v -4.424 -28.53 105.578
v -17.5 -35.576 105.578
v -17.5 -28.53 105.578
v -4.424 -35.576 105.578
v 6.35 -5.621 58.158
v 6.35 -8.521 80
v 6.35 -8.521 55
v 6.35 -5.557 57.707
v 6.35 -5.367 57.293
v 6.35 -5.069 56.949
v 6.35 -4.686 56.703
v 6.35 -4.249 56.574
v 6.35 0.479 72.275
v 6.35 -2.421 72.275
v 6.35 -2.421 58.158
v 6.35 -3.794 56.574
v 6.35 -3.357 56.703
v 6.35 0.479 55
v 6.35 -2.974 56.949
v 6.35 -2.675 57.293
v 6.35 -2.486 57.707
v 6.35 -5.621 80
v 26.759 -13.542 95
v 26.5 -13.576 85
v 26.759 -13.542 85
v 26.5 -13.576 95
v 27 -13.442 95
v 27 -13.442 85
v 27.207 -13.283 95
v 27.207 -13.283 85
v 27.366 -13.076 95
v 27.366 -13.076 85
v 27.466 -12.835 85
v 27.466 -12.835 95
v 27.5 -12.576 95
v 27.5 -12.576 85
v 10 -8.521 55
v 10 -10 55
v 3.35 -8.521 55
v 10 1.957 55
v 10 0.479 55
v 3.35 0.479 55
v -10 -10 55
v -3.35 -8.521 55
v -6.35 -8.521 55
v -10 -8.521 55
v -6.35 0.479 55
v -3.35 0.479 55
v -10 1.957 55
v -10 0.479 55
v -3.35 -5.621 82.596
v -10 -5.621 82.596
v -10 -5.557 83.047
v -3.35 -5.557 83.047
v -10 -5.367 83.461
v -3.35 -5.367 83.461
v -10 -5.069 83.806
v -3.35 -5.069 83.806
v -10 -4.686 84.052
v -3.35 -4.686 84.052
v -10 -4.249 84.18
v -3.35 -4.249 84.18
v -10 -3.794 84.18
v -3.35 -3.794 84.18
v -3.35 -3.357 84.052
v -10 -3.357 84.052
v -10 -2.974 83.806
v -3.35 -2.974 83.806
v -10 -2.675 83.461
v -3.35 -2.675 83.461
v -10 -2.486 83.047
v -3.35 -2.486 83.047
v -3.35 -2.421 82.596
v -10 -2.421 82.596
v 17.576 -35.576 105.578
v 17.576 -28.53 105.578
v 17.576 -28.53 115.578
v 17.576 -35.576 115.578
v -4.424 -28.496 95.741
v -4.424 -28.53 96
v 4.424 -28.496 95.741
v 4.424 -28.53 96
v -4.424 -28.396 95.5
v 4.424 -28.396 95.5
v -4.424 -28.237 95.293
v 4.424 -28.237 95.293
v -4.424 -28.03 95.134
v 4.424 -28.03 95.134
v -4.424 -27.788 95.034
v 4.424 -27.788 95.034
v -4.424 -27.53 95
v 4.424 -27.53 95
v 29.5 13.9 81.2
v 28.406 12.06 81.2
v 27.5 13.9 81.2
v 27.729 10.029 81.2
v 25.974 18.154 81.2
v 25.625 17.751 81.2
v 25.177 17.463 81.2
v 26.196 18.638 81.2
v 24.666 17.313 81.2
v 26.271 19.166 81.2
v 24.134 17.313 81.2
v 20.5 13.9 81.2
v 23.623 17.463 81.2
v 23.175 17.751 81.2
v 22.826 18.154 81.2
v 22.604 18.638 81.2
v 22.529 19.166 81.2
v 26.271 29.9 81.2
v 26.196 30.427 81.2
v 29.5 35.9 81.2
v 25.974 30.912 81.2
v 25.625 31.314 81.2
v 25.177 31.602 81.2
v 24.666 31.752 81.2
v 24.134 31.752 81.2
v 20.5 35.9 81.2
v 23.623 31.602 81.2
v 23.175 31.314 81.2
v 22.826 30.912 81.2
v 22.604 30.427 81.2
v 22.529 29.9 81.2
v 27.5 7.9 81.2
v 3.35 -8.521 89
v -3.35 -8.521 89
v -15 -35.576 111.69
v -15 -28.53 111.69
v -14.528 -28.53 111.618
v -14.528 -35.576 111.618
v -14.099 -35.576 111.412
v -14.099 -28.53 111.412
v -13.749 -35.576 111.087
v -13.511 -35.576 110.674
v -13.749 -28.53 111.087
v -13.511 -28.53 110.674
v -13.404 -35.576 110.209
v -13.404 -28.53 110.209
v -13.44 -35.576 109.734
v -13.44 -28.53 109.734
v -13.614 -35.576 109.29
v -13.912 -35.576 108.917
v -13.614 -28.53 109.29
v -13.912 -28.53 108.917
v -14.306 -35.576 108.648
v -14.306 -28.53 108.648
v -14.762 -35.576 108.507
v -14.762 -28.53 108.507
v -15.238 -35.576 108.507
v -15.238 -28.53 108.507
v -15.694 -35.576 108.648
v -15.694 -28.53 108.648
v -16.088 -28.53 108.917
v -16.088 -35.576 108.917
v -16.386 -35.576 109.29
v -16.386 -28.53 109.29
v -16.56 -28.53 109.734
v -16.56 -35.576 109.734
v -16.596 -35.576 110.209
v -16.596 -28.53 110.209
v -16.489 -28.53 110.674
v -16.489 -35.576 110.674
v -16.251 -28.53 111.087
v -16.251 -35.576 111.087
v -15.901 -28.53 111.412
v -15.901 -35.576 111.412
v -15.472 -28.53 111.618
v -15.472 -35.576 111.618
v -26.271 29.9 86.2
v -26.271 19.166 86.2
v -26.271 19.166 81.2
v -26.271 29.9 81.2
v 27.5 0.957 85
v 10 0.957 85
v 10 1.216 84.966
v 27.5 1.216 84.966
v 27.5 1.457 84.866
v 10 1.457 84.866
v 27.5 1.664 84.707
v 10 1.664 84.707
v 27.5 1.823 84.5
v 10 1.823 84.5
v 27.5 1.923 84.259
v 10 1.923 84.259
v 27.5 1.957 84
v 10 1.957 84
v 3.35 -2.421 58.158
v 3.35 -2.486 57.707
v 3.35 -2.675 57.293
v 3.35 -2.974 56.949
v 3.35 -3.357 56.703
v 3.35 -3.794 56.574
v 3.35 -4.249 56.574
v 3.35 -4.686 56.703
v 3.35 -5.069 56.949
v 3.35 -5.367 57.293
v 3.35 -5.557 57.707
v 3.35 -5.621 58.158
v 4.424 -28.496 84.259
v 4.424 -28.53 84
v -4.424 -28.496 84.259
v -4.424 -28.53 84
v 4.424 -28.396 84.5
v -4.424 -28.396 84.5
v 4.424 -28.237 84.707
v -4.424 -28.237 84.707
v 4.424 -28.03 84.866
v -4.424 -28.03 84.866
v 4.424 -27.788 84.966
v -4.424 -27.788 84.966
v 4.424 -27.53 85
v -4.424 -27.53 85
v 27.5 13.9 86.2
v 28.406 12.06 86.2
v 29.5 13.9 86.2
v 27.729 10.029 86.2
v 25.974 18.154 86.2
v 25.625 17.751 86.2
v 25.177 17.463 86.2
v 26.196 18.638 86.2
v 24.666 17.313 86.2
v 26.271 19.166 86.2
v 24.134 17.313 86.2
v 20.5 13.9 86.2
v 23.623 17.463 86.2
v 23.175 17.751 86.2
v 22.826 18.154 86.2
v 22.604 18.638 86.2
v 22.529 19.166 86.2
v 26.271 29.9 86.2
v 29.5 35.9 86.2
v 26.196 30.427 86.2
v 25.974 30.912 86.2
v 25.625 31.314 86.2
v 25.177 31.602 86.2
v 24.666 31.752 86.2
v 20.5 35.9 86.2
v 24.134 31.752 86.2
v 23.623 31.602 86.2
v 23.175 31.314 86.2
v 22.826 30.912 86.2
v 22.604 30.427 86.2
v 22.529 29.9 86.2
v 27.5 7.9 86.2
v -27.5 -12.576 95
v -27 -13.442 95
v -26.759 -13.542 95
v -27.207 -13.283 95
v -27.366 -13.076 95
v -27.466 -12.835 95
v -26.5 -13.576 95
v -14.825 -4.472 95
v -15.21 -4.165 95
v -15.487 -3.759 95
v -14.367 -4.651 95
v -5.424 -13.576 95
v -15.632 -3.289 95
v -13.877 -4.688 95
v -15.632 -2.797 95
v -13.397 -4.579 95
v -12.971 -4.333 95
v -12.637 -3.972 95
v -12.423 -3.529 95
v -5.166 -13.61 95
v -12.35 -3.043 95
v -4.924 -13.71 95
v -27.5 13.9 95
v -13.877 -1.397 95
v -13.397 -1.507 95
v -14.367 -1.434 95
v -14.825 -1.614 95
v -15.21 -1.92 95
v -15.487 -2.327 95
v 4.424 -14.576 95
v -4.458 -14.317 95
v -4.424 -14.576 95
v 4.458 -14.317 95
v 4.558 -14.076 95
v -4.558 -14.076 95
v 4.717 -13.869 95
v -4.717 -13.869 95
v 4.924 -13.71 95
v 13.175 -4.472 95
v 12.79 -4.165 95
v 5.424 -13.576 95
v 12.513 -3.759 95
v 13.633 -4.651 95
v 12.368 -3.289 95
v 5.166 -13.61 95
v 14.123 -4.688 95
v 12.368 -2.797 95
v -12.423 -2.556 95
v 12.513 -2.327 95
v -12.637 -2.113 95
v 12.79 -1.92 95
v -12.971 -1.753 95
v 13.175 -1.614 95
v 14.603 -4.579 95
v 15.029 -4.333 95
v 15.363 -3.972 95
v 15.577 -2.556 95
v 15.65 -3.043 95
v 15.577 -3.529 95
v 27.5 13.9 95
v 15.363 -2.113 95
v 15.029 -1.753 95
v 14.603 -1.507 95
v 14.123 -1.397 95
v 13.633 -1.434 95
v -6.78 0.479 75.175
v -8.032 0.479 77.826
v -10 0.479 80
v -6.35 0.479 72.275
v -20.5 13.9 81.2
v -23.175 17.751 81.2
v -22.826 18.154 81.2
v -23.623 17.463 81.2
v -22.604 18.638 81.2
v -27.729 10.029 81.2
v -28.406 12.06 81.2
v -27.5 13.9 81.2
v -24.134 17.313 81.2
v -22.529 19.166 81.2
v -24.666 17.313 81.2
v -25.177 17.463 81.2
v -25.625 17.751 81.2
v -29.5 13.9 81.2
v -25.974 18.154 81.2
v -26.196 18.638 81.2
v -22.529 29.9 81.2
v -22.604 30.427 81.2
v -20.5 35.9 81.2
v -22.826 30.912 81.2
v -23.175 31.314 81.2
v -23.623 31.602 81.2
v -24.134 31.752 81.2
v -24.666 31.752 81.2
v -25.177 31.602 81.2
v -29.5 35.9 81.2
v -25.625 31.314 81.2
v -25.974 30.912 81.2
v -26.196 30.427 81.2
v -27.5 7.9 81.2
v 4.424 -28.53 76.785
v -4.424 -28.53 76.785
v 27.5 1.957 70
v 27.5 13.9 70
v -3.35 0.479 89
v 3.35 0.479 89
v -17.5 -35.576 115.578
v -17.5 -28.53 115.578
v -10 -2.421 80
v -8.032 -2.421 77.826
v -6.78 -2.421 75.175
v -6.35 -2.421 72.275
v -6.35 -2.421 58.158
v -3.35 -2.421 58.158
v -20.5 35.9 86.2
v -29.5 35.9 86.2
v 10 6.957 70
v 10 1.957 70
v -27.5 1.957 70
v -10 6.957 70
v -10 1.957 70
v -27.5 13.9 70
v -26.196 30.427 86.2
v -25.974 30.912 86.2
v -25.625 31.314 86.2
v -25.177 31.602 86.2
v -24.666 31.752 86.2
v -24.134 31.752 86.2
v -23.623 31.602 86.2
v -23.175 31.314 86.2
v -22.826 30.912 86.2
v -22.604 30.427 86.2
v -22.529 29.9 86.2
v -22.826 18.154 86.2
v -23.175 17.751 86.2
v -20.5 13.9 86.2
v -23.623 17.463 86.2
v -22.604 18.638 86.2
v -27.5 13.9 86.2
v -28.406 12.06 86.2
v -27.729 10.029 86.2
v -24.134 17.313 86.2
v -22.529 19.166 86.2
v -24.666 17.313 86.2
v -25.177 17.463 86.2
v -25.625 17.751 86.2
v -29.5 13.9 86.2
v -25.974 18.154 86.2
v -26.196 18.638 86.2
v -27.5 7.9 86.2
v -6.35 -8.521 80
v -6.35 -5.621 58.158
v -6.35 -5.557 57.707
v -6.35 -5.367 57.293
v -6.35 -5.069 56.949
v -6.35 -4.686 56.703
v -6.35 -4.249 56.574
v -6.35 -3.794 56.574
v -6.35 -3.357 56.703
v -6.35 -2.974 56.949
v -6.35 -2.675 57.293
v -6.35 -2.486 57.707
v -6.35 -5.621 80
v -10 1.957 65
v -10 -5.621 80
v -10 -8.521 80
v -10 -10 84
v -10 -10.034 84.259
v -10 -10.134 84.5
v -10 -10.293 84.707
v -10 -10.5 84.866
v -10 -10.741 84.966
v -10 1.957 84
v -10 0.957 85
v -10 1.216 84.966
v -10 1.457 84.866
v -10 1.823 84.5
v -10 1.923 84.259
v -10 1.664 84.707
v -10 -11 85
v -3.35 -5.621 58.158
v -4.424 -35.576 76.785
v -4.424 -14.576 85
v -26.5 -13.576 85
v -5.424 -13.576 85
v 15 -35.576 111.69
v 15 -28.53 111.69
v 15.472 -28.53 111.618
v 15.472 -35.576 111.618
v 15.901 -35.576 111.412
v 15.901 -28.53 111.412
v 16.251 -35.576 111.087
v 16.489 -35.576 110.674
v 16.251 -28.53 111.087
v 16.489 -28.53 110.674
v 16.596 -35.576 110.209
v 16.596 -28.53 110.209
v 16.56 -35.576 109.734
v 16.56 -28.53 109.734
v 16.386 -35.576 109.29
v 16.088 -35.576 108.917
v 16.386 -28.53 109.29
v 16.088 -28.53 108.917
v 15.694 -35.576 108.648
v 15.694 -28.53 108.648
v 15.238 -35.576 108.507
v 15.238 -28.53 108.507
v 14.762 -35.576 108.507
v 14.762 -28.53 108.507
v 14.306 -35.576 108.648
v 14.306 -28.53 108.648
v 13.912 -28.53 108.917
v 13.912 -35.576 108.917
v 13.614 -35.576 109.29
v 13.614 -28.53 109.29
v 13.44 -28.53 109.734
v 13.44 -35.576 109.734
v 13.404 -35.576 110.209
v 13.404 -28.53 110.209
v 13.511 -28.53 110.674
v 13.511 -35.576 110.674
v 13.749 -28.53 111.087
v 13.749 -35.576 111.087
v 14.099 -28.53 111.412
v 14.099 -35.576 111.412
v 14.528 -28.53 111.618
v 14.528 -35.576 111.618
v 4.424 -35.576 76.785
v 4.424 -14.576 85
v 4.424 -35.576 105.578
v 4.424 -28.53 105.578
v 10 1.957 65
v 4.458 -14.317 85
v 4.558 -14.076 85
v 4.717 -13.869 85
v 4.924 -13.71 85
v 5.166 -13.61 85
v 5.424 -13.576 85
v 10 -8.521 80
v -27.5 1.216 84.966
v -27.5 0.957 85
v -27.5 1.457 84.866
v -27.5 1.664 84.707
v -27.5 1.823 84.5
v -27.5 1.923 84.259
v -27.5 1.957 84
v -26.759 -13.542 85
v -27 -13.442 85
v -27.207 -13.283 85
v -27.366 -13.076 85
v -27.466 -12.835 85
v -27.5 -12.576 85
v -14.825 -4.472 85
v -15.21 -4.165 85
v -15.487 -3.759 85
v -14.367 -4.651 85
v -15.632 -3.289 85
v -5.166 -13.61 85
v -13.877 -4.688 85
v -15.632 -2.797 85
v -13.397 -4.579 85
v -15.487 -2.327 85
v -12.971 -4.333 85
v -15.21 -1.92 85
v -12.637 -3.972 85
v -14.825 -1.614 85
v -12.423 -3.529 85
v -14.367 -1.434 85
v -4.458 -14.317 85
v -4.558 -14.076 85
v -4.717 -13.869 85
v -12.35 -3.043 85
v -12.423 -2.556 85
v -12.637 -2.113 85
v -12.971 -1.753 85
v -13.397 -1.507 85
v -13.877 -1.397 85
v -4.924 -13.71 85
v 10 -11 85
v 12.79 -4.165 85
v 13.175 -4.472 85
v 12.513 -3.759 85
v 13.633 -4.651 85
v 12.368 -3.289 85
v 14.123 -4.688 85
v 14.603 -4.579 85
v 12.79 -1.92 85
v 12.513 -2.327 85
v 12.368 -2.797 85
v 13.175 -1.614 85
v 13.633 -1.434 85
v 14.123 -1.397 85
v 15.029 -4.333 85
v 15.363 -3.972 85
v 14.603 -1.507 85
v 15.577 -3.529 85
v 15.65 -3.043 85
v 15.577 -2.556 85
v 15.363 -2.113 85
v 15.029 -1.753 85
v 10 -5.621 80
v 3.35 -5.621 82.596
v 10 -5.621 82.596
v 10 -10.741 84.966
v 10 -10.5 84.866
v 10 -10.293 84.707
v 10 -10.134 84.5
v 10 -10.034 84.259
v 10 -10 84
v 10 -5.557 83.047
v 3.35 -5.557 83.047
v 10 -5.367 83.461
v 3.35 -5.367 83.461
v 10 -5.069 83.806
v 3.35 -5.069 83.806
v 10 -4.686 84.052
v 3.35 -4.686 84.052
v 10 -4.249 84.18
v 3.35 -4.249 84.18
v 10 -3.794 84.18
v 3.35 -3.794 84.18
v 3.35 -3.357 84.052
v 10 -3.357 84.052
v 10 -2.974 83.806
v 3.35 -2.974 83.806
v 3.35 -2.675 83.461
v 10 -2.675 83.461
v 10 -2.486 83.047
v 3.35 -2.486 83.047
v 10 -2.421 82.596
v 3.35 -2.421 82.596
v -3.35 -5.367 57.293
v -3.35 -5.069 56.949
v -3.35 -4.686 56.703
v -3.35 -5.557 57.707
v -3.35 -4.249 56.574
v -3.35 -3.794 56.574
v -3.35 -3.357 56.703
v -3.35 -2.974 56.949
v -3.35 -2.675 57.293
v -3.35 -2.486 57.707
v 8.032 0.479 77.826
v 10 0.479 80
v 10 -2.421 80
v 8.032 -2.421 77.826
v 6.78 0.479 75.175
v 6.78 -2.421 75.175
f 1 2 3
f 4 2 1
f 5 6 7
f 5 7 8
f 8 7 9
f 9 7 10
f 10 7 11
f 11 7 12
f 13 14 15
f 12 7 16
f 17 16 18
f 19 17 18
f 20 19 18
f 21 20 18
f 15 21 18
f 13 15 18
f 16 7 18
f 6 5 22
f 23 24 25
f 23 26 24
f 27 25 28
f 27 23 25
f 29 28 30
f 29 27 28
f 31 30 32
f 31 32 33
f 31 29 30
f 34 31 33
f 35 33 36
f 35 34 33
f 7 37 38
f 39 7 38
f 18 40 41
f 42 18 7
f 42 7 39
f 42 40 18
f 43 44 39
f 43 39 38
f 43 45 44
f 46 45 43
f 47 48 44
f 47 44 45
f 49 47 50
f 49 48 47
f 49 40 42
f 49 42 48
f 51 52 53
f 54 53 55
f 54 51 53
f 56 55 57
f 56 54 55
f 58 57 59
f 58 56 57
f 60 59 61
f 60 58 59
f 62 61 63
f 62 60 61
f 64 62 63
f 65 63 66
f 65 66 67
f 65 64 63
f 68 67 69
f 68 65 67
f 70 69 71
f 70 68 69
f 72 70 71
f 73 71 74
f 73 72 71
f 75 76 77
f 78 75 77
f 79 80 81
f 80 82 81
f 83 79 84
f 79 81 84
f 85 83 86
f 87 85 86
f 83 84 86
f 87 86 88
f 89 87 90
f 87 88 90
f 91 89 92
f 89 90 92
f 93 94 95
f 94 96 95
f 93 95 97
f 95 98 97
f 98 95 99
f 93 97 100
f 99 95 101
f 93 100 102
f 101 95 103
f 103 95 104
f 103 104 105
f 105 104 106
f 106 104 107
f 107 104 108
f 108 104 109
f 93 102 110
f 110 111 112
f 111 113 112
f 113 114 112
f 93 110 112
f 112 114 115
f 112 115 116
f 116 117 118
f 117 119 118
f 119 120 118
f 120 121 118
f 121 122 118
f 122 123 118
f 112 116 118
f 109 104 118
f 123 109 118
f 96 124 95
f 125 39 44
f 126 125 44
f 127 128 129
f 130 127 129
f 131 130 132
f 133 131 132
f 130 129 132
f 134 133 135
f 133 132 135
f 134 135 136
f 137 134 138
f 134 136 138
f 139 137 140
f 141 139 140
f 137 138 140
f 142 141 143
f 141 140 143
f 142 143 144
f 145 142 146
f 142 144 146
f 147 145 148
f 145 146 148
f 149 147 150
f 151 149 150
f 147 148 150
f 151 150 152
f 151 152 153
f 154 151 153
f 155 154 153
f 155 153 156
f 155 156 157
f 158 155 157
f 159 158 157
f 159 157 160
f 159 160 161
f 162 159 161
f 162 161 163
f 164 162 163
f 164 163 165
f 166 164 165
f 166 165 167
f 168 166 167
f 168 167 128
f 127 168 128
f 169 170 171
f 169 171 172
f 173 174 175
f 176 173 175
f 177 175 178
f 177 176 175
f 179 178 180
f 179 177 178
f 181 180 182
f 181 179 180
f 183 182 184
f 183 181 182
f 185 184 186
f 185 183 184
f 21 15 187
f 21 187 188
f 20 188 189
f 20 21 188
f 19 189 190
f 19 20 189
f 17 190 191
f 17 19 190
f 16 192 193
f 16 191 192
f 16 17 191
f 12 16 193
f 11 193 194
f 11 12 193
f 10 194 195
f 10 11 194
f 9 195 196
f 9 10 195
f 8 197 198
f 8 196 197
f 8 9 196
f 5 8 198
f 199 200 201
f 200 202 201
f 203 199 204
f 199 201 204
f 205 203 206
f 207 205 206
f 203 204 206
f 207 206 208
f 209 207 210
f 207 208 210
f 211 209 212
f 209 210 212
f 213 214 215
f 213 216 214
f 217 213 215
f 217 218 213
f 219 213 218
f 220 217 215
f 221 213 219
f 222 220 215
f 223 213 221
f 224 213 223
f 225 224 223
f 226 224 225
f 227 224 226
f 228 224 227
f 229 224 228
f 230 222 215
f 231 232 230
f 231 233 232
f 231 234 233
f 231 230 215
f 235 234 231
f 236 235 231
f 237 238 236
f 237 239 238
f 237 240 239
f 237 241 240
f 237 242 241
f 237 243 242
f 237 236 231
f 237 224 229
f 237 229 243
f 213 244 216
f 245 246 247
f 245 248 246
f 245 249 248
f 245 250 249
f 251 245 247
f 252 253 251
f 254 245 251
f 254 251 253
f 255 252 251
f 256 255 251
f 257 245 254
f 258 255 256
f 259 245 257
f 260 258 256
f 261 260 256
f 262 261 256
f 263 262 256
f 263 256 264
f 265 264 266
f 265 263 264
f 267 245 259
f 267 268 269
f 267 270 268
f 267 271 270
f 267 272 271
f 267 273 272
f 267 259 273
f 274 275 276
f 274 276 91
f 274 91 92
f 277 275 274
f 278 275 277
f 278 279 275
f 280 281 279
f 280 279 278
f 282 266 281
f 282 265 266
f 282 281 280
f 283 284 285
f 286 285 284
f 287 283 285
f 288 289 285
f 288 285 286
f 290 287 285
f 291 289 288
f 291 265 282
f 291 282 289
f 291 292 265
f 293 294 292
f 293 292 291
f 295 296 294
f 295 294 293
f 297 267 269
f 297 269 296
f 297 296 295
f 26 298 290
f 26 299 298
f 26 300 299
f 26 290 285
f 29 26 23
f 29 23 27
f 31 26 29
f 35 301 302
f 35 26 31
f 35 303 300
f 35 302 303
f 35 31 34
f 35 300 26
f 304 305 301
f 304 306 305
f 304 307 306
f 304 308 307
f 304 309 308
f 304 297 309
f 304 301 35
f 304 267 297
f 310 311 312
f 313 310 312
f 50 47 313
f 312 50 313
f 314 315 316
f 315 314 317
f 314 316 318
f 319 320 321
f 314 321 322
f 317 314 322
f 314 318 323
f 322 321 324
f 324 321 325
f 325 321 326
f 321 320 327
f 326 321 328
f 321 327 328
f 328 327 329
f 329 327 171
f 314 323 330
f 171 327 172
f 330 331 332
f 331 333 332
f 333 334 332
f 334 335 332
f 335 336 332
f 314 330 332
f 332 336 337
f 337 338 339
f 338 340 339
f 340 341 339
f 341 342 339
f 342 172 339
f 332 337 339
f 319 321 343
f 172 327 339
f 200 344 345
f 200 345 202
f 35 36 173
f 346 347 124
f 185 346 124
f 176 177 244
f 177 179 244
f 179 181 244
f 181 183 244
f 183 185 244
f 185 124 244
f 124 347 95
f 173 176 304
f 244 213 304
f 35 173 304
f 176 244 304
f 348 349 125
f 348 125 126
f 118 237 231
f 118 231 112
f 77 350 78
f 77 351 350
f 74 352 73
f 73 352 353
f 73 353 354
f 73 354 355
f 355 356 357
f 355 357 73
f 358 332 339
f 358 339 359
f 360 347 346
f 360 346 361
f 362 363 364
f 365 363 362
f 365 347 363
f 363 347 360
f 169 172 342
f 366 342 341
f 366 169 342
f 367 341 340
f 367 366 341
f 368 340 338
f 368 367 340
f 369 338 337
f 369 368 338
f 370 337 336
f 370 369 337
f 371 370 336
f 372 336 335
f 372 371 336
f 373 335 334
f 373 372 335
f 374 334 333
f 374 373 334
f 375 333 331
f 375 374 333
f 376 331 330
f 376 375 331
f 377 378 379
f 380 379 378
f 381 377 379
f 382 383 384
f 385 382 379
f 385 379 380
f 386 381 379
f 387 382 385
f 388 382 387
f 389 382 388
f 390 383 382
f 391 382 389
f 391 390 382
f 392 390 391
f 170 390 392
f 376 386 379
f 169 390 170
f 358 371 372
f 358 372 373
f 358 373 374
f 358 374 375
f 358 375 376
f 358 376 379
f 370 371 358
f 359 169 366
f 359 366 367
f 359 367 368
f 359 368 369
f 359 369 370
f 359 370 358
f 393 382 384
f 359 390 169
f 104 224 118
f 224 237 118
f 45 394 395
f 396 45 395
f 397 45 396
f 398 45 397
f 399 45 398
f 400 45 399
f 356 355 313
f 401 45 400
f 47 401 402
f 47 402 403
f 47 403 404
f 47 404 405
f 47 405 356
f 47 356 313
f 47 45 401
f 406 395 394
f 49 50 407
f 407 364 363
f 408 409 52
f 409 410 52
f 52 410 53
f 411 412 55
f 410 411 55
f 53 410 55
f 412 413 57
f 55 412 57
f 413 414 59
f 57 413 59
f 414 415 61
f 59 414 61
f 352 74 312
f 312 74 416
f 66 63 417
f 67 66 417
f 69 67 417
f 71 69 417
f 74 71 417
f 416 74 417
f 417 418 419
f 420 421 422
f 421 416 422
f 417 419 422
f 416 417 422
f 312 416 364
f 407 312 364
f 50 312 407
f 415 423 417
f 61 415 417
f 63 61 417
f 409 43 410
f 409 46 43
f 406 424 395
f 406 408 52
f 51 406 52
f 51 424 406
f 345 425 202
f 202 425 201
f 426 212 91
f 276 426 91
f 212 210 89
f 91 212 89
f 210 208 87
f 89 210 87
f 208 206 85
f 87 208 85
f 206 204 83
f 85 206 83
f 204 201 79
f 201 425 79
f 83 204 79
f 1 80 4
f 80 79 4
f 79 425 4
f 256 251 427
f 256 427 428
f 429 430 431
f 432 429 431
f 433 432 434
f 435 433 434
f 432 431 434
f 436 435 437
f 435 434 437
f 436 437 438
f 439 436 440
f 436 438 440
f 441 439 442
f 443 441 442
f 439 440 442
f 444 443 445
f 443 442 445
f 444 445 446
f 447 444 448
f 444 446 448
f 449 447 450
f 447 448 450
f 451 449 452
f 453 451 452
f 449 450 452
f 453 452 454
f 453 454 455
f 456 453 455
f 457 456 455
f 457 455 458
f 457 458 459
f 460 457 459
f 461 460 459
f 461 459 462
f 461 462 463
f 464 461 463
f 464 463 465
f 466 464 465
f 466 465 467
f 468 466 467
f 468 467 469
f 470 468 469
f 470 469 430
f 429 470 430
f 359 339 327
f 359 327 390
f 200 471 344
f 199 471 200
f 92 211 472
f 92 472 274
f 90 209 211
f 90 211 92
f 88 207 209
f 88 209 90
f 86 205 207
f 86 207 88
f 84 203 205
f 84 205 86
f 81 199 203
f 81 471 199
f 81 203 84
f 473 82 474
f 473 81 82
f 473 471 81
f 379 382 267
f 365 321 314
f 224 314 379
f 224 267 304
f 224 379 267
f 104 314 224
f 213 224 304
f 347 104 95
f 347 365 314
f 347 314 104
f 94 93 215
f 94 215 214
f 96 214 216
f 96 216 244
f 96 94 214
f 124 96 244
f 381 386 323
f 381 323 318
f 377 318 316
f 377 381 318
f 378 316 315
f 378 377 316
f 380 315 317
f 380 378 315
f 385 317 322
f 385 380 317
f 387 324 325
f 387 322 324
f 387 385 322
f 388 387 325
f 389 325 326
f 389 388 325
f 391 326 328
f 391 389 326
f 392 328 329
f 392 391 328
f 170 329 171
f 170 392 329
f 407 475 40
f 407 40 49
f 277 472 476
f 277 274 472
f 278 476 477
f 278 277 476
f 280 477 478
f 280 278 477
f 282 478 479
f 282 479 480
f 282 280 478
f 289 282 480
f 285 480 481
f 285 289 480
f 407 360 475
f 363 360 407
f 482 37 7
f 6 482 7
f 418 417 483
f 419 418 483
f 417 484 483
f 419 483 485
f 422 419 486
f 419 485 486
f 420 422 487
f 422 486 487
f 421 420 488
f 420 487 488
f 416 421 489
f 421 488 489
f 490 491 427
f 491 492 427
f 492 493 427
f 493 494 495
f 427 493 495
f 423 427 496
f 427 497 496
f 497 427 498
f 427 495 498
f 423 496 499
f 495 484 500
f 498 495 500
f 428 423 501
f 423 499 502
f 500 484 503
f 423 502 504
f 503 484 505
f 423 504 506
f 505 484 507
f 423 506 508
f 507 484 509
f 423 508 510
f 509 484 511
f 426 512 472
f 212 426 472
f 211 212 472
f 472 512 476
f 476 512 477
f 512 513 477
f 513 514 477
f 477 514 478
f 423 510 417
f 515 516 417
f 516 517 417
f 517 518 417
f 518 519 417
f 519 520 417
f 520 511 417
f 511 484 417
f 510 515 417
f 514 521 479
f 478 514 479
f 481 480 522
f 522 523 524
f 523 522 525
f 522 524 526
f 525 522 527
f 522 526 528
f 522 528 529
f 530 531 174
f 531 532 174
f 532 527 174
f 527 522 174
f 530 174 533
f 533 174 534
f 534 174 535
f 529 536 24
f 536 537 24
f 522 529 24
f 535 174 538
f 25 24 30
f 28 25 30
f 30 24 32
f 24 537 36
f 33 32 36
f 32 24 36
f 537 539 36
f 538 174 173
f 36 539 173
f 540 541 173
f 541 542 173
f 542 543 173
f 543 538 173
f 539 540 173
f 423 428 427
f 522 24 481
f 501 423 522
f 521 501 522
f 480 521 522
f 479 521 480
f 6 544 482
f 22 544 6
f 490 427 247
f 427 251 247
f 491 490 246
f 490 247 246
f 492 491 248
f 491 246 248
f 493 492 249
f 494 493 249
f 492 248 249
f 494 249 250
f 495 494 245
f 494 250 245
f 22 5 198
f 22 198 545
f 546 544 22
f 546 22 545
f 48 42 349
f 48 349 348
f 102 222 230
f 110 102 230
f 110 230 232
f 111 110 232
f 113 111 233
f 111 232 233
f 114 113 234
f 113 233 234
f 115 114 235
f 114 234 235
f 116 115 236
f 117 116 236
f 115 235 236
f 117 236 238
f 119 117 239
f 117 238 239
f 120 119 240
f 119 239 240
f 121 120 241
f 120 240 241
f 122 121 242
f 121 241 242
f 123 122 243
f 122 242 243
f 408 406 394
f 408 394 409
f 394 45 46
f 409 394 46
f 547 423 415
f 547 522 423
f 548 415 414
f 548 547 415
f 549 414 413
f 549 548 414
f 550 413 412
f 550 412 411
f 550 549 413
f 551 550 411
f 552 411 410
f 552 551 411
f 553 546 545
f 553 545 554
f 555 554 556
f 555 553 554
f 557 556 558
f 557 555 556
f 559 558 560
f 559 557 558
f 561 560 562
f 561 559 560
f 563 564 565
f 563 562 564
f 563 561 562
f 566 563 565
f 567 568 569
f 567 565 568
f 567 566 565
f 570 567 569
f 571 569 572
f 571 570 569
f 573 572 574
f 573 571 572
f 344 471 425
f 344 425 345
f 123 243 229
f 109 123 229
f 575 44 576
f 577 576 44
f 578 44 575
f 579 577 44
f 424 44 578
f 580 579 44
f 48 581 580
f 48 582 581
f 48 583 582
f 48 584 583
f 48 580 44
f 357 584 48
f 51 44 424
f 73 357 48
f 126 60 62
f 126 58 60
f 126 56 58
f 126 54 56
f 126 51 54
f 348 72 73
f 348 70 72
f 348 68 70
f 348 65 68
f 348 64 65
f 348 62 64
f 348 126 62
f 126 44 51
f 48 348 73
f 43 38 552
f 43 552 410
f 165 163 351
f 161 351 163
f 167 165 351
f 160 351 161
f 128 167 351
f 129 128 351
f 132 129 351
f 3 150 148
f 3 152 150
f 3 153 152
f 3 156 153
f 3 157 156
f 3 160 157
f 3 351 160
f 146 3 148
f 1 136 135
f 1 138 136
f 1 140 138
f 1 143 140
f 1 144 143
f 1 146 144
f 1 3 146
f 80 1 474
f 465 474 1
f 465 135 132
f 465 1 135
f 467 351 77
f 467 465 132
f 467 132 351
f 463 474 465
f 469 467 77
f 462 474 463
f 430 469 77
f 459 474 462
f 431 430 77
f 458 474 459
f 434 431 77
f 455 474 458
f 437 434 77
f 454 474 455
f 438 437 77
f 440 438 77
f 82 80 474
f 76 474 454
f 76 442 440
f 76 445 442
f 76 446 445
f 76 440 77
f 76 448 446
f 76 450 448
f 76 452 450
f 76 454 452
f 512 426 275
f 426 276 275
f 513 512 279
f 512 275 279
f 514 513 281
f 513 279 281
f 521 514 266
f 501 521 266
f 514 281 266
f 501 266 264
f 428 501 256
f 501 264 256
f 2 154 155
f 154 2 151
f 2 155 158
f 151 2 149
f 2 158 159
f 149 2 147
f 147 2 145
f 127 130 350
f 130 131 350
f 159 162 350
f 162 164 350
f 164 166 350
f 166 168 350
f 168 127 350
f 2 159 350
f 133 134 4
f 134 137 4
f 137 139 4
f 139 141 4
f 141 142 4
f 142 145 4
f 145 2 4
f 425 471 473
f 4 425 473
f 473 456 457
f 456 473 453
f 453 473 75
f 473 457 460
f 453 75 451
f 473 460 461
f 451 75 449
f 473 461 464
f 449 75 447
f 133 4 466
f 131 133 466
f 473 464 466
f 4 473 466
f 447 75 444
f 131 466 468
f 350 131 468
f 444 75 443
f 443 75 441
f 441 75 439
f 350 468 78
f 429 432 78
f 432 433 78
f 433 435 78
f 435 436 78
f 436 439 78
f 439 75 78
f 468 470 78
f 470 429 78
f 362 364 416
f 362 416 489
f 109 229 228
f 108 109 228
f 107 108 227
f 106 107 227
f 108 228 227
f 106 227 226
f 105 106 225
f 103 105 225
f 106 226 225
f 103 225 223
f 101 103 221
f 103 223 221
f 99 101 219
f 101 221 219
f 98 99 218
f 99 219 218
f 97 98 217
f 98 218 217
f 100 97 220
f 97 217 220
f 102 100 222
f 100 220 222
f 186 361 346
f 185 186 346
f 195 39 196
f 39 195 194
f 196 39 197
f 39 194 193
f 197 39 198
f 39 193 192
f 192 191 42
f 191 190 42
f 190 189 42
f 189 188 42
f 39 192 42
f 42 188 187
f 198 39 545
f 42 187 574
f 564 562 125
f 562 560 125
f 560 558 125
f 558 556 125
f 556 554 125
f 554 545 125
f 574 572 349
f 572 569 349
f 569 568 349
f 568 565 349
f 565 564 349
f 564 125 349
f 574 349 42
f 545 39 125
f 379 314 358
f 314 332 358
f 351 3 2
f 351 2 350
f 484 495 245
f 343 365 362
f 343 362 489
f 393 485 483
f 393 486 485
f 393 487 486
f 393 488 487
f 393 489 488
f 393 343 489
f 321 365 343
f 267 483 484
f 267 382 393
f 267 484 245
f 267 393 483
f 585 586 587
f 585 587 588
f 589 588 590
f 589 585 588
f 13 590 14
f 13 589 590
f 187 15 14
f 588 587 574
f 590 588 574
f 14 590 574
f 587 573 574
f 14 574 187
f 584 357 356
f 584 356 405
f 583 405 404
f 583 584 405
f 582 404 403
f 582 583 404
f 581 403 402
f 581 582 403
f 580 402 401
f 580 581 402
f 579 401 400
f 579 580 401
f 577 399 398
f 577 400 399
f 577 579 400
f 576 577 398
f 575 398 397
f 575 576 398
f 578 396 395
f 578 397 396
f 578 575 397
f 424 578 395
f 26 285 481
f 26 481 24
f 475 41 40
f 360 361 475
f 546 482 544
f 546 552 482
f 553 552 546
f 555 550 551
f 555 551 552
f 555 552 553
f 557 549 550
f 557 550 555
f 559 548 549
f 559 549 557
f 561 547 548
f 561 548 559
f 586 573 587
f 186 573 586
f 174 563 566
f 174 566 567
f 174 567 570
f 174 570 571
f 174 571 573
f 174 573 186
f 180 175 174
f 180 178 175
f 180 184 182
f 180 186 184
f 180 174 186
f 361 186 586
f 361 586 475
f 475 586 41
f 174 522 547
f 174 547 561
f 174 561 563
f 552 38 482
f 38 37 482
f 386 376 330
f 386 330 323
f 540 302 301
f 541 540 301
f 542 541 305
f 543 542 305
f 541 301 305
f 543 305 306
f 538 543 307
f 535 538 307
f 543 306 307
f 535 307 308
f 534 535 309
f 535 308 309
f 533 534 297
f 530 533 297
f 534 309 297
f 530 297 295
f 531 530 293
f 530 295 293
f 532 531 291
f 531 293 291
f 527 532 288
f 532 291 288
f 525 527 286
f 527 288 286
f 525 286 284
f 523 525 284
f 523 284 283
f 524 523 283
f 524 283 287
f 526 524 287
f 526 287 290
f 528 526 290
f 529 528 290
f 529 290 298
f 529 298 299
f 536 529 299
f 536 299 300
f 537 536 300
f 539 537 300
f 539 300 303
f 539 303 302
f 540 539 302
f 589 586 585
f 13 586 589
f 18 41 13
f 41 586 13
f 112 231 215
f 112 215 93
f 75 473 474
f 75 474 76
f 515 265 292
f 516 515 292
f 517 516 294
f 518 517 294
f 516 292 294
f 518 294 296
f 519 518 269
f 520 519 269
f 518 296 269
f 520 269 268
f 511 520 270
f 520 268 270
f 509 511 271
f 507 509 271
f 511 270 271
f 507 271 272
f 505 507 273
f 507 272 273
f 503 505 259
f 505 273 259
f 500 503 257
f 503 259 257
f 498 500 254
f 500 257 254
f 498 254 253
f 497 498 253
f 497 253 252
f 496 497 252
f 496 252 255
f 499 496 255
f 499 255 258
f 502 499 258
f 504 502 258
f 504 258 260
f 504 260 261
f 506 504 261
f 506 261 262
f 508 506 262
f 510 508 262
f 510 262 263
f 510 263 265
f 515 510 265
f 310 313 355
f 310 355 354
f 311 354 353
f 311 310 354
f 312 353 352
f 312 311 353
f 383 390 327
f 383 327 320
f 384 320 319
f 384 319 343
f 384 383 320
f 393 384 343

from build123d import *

# Parameters (mm, degrees)
SKETCH_1_W            = 35
SKETCH_1_H            = 40
EXTRUDE_1_DEPTH       = 5
SKETCH_2_W            = 20
SKETCH_2_H            = 20
EXTRUDE_2_DEPTH       = 65
SKETCH_3_W            = 56
SKETCH_3_H            = 11
SKETCH_3_W_2          = 4.5
CUT_EXTRUDE_1_DEPTH   = 78.821912081
SKETCH_5_W            = 55
SKETCH_5_H            = 20
EXTRUDE_3_DEPTH       = 25
SKETCH_9_R            = 1.65
CUT_EXTRUDE_3_DEPTH   = 27
SKETCH_10_W           = 55
SKETCH_10_H           = 25
EXTRUDE_4_DEPTH       = 4.9
SKETCH_11_W           = 7
SKETCH_11_H           = 5
EXTRUDE_5_DEPTH       = 21
CHAMFER_2_SIZE        = 10
CHAMFER_3_SIZE        = 3
CHAMFER_4_SIZE        = 2
CUT_EXTRUDE_7_DEPTH   = 15
SKETCH_16_W           = 12.984556049
SKETCH_16_H           = 11
EXTRUDE_6_DEPTH       = 20
CHAMFER_5_SIZE        = 3
SKETCH_19_R           = 1.6
CUT_EXTRUDE_10_DEPTH  = 10
FILLET_1_R            = 5
SKETCH_20_W           = 5
SKETCH_20_H           = 22.5
EXTRUDE_7_DEPTH       = 17.5
SKETCH_21_W           = 5
SKETCH_21_H           = 22.5
EXTRUDE_8_DEPTH       = 5
SKETCH_22_W           = 5
SKETCH_22_H           = 22.5
EXTRUDE_9_DEPTH       = 10
SKETCH_23_W           = 5
SKETCH_23_H           = 22.5
EXTRUDE_10_DEPTH      = 10
SKETCH_24_W           = 3.3
SKETCH_24_H           = 22.5
EXTRUDE_11_DEPTH      = 4
SKETCH_26_W           = 5
SKETCH_26_H           = 22.5
EXTRUDE_13_DEPTH      = 17.5
SKETCH_27_W           = 5
SKETCH_27_H           = 22.5
EXTRUDE_14_DEPTH      = 5
SKETCH_28_W           = 5
SKETCH_28_H           = 22.5
EXTRUDE_15_DEPTH      = 10
SKETCH_29_W           = 5
SKETCH_29_H           = 22.5
EXTRUDE_16_DEPTH      = 10
SKETCH_31_W           = 3.4
SKETCH_31_H           = 22.5
EXTRUDE_18_DEPTH      = 4
SKETCH_39_W           = 7.13678645
SKETCH_39_H           = 13.518332953
SKETCH_39_W_2         = 8.139264071
SKETCH_39_H_2         = 10.52230198
CUT_EXTRUDE_17_DEPTH  = 35
SKETCH_40_W           = 55
SKETCH_40_H           = 10
EXTRUDE_20_DEPTH      = 25.575713879
SKETCH_41_W           = 8.84873954
SKETCH_41_H           = 7.046133319
EXTRUDE_21_DEPTH      = 20.577981656
EXTRUDE_22_DEPTH      = 13.07563
EXTRUDE_22_DEPTH_BACK = 22
SKETCH_42_W           = 38.79276714
SKETCH_42_H           = 7.046133319
SKETCH_43_W           = 23.07563023
SKETCH_43_H           = 28.79276714
CUT_EXTRUDE_18_DEPTH  = 22
FILLET_3_R            = 1
SKETCH_46_W           = 9.238205764
SKETCH_46_H           = 22.5
EXTRUDE_26_DEPTH      = 10
CUT_EXTRUDE_19_DEPTH  = 10
SKETCH_48_R           = 1.6
CUT_EXTRUDE_20_DEPTH  = 10
CUT_EXTRUDE_21_DEPTH  = 10
SKETCH_50_W           = 2.57104036
SKETCH_50_H           = 22.5
SKETCH_50_W_2         = 2.865096637
EXTRUDE_27_DEPTH      = 10
SKETCH_53_W           = 4.304606657
SKETCH_53_H           = 10
SKETCH_53_W_2         = 2.865096637
EXTRUDE_28_DEPTH      = 11
SKETCH_51_R           = 1.6
CUT_EXTRUDE_22_DEPTH  = 12
SKETCH_52_W           = 17.2
SKETCH_52_H           = 6.8
CUT_EXTRUDE_23_DEPTH  = 39
CUT_EXTRUDE_24_DEPTH  = 10
SKETCH_55_W           = 32
SKETCH_55_H           = 22.5
EXTRUDE_29_DEPTH      = 12
SKETCH_56_W           = 10.301119562
SKETCH_56_H           = 22.5
CUT_EXTRUDE_25_DEPTH  = 7
SKETCH_57_W           = 3
SKETCH_57_H           = 4.95
EXTRUDE_30_DEPTH      = 8
SKETCH_58_W           = 9
SKETCH_58_H           = 22.5
SKETCH_58_W_2         = 8.434386946
CUT_EXTRUDE_26_DEPTH  = 10.05
CUT_EXTRUDE_27_DEPTH  = 1
SKETCH_60_W           = 2.55
SKETCH_60_H           = 22.5
EXTRUDE_31_DEPTH      = 12
SKETCH_61_W           = 3.965384327
SKETCH_61_H           = 22.5
CUT_EXTRUDE_28_DEPTH  = 6.95
SKETCH_62_W           = 5
SKETCH_62_H           = 22
EXTRUDE_32_DEPTH      = 2
SKETCH_63_W           = 5
SKETCH_63_H           = 22
EXTRUDE_33_DEPTH      = 2
SKETCH_64_W           = 5
SKETCH_64_H           = 22.5
EXTRUDE_34_DEPTH      = 8
SKETCH_65_W           = 0.1
SKETCH_65_H           = 22.5
CUT_EXTRUDE_30_DEPTH  = 15
SKETCH_66_W           = 5
SKETCH_66_H           = 22.5
EXTRUDE_35_DEPTH      = 8
SKETCH_67_R           = 1.1
CUT_EXTRUDE_31_DEPTH  = 9
SKETCH_68_W           = 0.1
SKETCH_68_H           = 22.5
CUT_EXTRUDE_32_DEPTH  = 12
SKETCH_69_W           = 12
SKETCH_69_H           = 22.5
EXTRUDE_36_DEPTH      = 5
SKETCH_70_W           = 107.728068616
SKETCH_70_H           = 75.066227262
CUT_EXTRUDE_33_DEPTH  = 130
SKETCH_73_W           = 6.7
SKETCH_73_H           = 9
CUT_EXTRUDE_34_DEPTH  = 19
FILLET_5_R            = 10
SKETCH_75_W           = 20
SKETCH_75_H           = 11.957252994
SKETCH_75_W_2         = 6.7
SKETCH_75_H_2         = 9
EXTRUDE_38_DEPTH      = 15
CUT_EXTRUDE_35_DEPTH  = 20
SKETCH_76_W           = 3.65
SKETCH_76_H           = 9
CUT_EXTRUDE_36_DEPTH  = 25
FILLET_6_R            = 10
CHAMFER_6_SIZE        = 5


with BuildPart() as part:
    # 草图1 → 凸台-拉伸1 (new body)
    with BuildSketch(Plane.XY):
        Rectangle(SKETCH_1_W, SKETCH_1_H)
    extrude(amount=EXTRUDE_1_DEPTH)

    # 草图2 → 凸台-拉伸2 (add)
    with BuildSketch(Plane.XY.offset(5)):
        Rectangle(SKETCH_2_W, SKETCH_2_H)
    extrude(amount=EXTRUDE_2_DEPTH)

    # 草图3 → 切除-拉伸1 (cut, through all)
    with BuildSketch(Plane.ZY.offset(10)):
        with Locations((37.5, 0)):
            Rectangle(SKETCH_3_W, SKETCH_3_H)
        with Locations((7.25, 0)):
            Rectangle(SKETCH_3_W_2, SKETCH_3_H)
    extrude(amount=-CUT_EXTRUDE_1_DEPTH, mode=Mode.SUBTRACT)

    # 草图5 → 凸台-拉伸3 (add)
    with BuildSketch(Plane.XY.offset(70)):
        Rectangle(SKETCH_5_W, SKETCH_5_H)
    extrude(amount=EXTRUDE_3_DEPTH)

    # 草图9 → 切除-拉伸3 (cut)
    with BuildSketch(Plane.XY.offset(95)):
        with Locations((-14, -3.042747006)):
            Circle(SKETCH_9_R)
        with Locations((14, -3.042747006)):
            Circle(SKETCH_9_R)
    extrude(amount=-CUT_EXTRUDE_3_DEPTH, mode=Mode.SUBTRACT)

    # 草图10 → 凸台-拉伸4 (add)
    with BuildSketch(Plane(origin=(0, 10, 0), x_dir=(1, 0, 0), z_dir=(0, 1, 0))):
        with Locations((0, -82.5)):
            Rectangle(SKETCH_10_W, SKETCH_10_H)
    extrude(amount=EXTRUDE_4_DEPTH)

    # 草图11 → 凸台-拉伸5 (add)
    with BuildSketch(Plane(origin=(0, 14.9, 0), x_dir=(1, 0, 0), z_dir=(0, 1, 0))):
        with Locations((-24, -83.7)):
            Rectangle(SKETCH_11_W, SKETCH_11_H)
        with Locations((24, -83.7)):
            Rectangle(SKETCH_11_W, SKETCH_11_H)
    extrude(amount=EXTRUDE_5_DEPTH)

    # 倒角2
    chamfer_2_edges = [part.edges().sort_by_distance(p)[0] for p in [
        (0, -5.5, 65.5),
    ]]
    chamfer(chamfer_2_edges, length=CHAMFER_2_SIZE)

    # 倒角3
    chamfer_3_edges = [part.edges().sort_by_distance(p)[0] for p in [
        (0, 10, 70),
    ]]
    chamfer(chamfer_3_edges, length=CHAMFER_3_SIZE)

    # 倒角4
    chamfer_4_edges = [part.edges().sort_by_distance(p)[0] for p in [
        (0, -10, 5),
    ]]
    chamfer(chamfer_4_edges, length=CHAMFER_4_SIZE)

    # 草图15 → 切除-拉伸7 (cut)
    with BuildSketch(Plane(origin=(0, 0, 70), x_dir=(-1, 0, 0), z_dir=(0, 0, -1))):
        Polygon((10, 1.957252994), (29.13083687, 1.957252994), (29.13083687, -8.042747006), (29.13083687, -10), (10, -10), (10, -8.042747006), align=None)
        Polygon((-29.13083687, 1.957252994), (-29.13083687, -8.042747006), (-29.13083687, -10), (-10, -10), (-10, -8.042747006), (-10, 1.957252994), align=None)
    extrude(amount=-CUT_EXTRUDE_7_DEPTH, mode=Mode.SUBTRACT)

    # 草图16 → 凸台-拉伸6 (add)
    with BuildSketch(Plane.ZY.offset(10)):
        with Locations((11.492278025, 0)):
            Rectangle(SKETCH_16_W, SKETCH_16_H)
    extrude(amount=-EXTRUDE_6_DEPTH)

    # 倒角5
    chamfer_5_edges = [part.edges().sort_by_distance(p)[0] for p in [
        (0, 5.5, 17.984556049),
    ]]
    chamfer(chamfer_5_edges, length=CHAMFER_5_SIZE)

    # 草图19 → 切除-拉伸10 (cut)
    with BuildSketch(Plane.XY.offset(86.2)):
        with Locations((-24.4, 29.9)):
            Circle(SKETCH_19_R)
        with Locations((-24.4, 19.9)):
            Circle(SKETCH_19_R)
        with Locations((24.4, 19.9)):
            Circle(SKETCH_19_R)
        with Locations((24.4, 29.9)):
            Circle(SKETCH_19_R)
    extrude(amount=-CUT_EXTRUDE_10_DEPTH, mode=Mode.SUBTRACT)

    # 圆角1
    fillet_1_edges = [part.edges().sort_by_distance(p)[0] for p in [
        (17.5, -20, 2.5),
        (-17.5, -20, 2.5),
        (-17.5, 20, 2.5),
        (17.5, 20, 2.5),
    ]]
    fillet(fillet_1_edges, radius=FILLET_1_R)

    # 草图20 → 凸台-拉伸7 (add)
    with BuildSketch(Plane.ZY.offset(17.5)):
        with Locations((2.5, 0)):
            Rectangle(SKETCH_20_W, SKETCH_20_H)
    extrude(amount=EXTRUDE_7_DEPTH)

    # 草图21 → 凸台-拉伸8 (add)
    with BuildSketch(Plane.ZY.offset(35)):
        with Locations((2.5, 0)):
            Rectangle(SKETCH_21_W, SKETCH_21_H)
    extrude(amount=EXTRUDE_8_DEPTH)

    # 草图22 → 凸台-拉伸9 (add)
    with BuildSketch(Plane(origin=(0, 0, 0), x_dir=(-1, 0, 0), z_dir=(0, 0, -1))):
        with Locations((37.5, 0)):
            Rectangle(SKETCH_22_W, SKETCH_22_H)
    extrude(amount=EXTRUDE_9_DEPTH)

    # 草图23 → 凸台-拉伸10 (add)
    with BuildSketch(Plane(origin=(0, 0, 0), x_dir=(-1, 0, 0), z_dir=(0, 0, -1))):
        with Locations((15.5, 0)):
            Rectangle(SKETCH_23_W, SKETCH_23_H)
    extrude(amount=EXTRUDE_10_DEPTH)

    # 草图24 → 凸台-拉伸11 (add)
    with BuildSketch(Plane.ZY.offset(18)):
        with Locations((-8.35, 0)):
            Rectangle(SKETCH_24_W, SKETCH_24_H)
    extrude(amount=EXTRUDE_11_DEPTH)

    # 草图26 → 凸台-拉伸13 (add)
    with BuildSketch(Plane(origin=(17.5, 0, 0), x_dir=(0, 0, -1), z_dir=(1, 0, 0))):
        with Locations((-2.5, 0)):
            Rectangle(SKETCH_26_W, SKETCH_26_H)
    extrude(amount=EXTRUDE_13_DEPTH)

    # 草图27 → 凸台-拉伸14 (add)
    with BuildSketch(Plane(origin=(35, 0, 0), x_dir=(0, 0, -1), z_dir=(1, 0, 0))):
        with Locations((-2.5, 0)):
            Rectangle(SKETCH_27_W, SKETCH_27_H)
    extrude(amount=EXTRUDE_14_DEPTH)

    # 草图28 → 凸台-拉伸15 (add)
    with BuildSketch(Plane(origin=(0, 0, 0), x_dir=(-1, 0, 0), z_dir=(0, 0, -1))):
        with Locations((-37.5, 0)):
            Rectangle(SKETCH_28_W, SKETCH_28_H)
    extrude(amount=EXTRUDE_15_DEPTH)

    # 草图29 → 凸台-拉伸16 (add)
    with BuildSketch(Plane(origin=(0, 0, 0), x_dir=(-1, 0, 0), z_dir=(0, 0, -1))):
        with Locations((-15.5, 0)):
            Rectangle(SKETCH_29_W, SKETCH_29_H)
    extrude(amount=EXTRUDE_16_DEPTH)

    # 草图31 → 凸台-拉伸18 (add)
    with BuildSketch(Plane(origin=(18, 0, 0), x_dir=(0, 0, -1), z_dir=(1, 0, 0))):
        with Locations((8.3, 0)):
            Rectangle(SKETCH_31_W, SKETCH_31_H)
    extrude(amount=EXTRUDE_18_DEPTH)

    # 草图39 → 切除-拉伸17 (cut)
    with BuildSketch(Plane.ZY.offset(17.5)):
        with Locations((3.568393225, 18.009166476)):
            Rectangle(SKETCH_39_W, SKETCH_39_H)
        with Locations((4.069632036, -16.51115099)):
            Rectangle(SKETCH_39_W_2, SKETCH_39_H_2)
    extrude(amount=-CUT_EXTRUDE_17_DEPTH, mode=Mode.SUBTRACT)

    # 草图40 → 凸台-拉伸20 (add)
    with BuildSketch(Plane.XZ.offset(10)):
        with Locations((0, 90)):
            Rectangle(SKETCH_40_W, SKETCH_40_H)
    extrude(amount=EXTRUDE_20_DEPTH)

    # 草图41 → 凸台-拉伸21 (add)
    with BuildSketch(Plane.XY.offset(95)):
        with Locations((0, -32.05264722)):
            Rectangle(SKETCH_41_W, SKETCH_41_H)
    extrude(amount=EXTRUDE_21_DEPTH)

    # 草图42 → 凸台-拉伸22 (add, two sides: drawn at the far end of the back side and taken through both)
    with BuildSketch(Plane.ZY.offset(4.42436977).offset(-EXTRUDE_22_DEPTH_BACK)):
        with Locations((96.181598086, -32.05264722)):
            Rectangle(SKETCH_42_W, SKETCH_42_H)
    extrude(amount=EXTRUDE_22_DEPTH + EXTRUDE_22_DEPTH_BACK)

    # 草图43 → 切除-拉伸18 (cut)
    with BuildSketch(Plane.XZ.offset(35.575713879)):
        with Locations((15.962184885, 91.181598086)):
            Rectangle(SKETCH_43_W, SKETCH_43_H)
        with Locations((-15.962184885, 91.181598086)):
            Rectangle(SKETCH_43_W, SKETCH_43_H)
    extrude(amount=-CUT_EXTRUDE_18_DEPTH, mode=Mode.SUBTRACT)

    # 圆角3
    fillet_3_edges = [part.edges().sort_by_distance(p)[0] for p in [
        (-18.75, 1.957252994, 85),
        (18.75, 1.957252994, 85),
        (0, -10, 85),
        (0, -28.52958056, 85),
        (0, -28.52958056, 95),
        (27.5, -13.575713879, 90),
        (4.42436977, -13.575713879, 90),
        (-27.5, -13.575713879, 90),
        (-4.42436977, -13.575713879, 90),
    ]]
    fillet(fillet_3_edges, radius=FILLET_3_R)

    # 草图46 → 凸台-拉伸26 (add)
    with BuildSketch(Plane(origin=(0, 0, 0), x_dir=(-1, 0, 0), z_dir=(0, 0, -1))):
        with Locations((-8.380897118, 0)):
            Rectangle(SKETCH_46_W, SKETCH_46_H)
    extrude(amount=EXTRUDE_26_DEPTH)

    # 草图47 → 切除-拉伸19 (cut)
    with BuildSketch(Plane(origin=(0, 0, -10), x_dir=(-1, 0, 0), z_dir=(0, 0, -1))):
        with BuildLine():
            Line((-8.066400893, 11.25), (-10.700516417, 11.25))
            Line((-10.700516417, 11.25), (-10.700516417, -11.25))
            Line((-10.700516417, -11.25), (-6.332834596, -11.25))
            ThreePointArc((-6.332834596, -11.25), (-6.663682414, -9.62836823), (-8.066400893, -8.75))
            Line((-8.066400893, -8.75), (-8.066400893, -7.900028072))
            ThreePointArc((-8.066400893, -7.900028072), (-6.289381928, -5.825014036), (-8.066400893, -3.75))
            Line((-8.066400893, -3.75), (-8.066400893, -2.900028072))
            ThreePointArc((-8.066400893, -2.900028072), (-6.289381928, -0.825014036), (-8.066400893, 1.25))
            Line((-8.066400893, 1.25), (-8.066400893, 2.099971928))
            ThreePointArc((-8.066400893, 2.099971928), (-6.289381928, 4.174985964), (-8.066400893, 6.25))
            Line((-8.066400893, 6.25), (-8.066400893, 7.099971928))
            ThreePointArc((-8.066400893, 7.099971928), (-6.289381928, 9.174985964), (-8.066400893, 11.25))
        make_face()
    extrude(amount=-CUT_EXTRUDE_19_DEPTH, mode=Mode.SUBTRACT)

    # 草图48 → 切除-拉伸20 (cut)
    with BuildSketch(Plane(origin=(0, -28.52958056, 0), x_dir=(1, 0, 0), z_dir=(0, 1, 0))):
        with Locations(Location((15, -110.089556655, 0), (0, 0, 270))):
            Circle(SKETCH_48_R)
        with Locations(Location((-15, -110.089556655, 0), (0, 0, 270))):
            Circle(SKETCH_48_R)
    extrude(amount=-CUT_EXTRUDE_20_DEPTH, mode=Mode.SUBTRACT)

    # 草图49 → 切除-拉伸21 (cut)
    with BuildSketch(Plane.XY.offset(86.2)):
        with BuildLine():
            Line((-22.528691915, 29.9), (-22.528691915, 19.165676086))
            ThreePointArc((-22.528691915, 19.165676086), (-24.4, 17.294368), (-26.271308085, 19.165676086))
            Line((-26.271308085, 19.165676086), (-26.271308085, 29.9))
            ThreePointArc((-26.271308085, 29.9), (-24.4, 31.771308085), (-22.528691915, 29.9))
        make_face()
        with BuildLine():
            Line((22.528691915, 29.9), (22.528691915, 19.165676086))
            ThreePointArc((22.528691915, 19.165676086), (24.4, 17.294368), (26.271308085, 19.165676086))
            Line((26.271308085, 19.165676086), (26.271308085, 29.9))
            ThreePointArc((26.271308085, 29.9), (24.4, 31.771308085), (22.528691915, 29.9))
        make_face()
    extrude(amount=-CUT_EXTRUDE_21_DEPTH, mode=Mode.SUBTRACT)

    # 草图50 → 凸台-拉伸27 (add)
    with BuildSketch(Plane(origin=(0, 0, -10), x_dir=(-1, 0, 0), z_dir=(0, 0, -1))):
        with Locations((-5.047314416, 0)):
            Rectangle(SKETCH_50_W, SKETCH_50_H)
        with Locations((-12.133064736, 0)):
            Rectangle(SKETCH_50_W_2, SKETCH_50_H)
    extrude(amount=EXTRUDE_27_DEPTH)

    # 草图53 → 凸台-拉伸28 (add)
    with BuildSketch(Plane(origin=(0, 11.25, 0), x_dir=(1, 0, 0), z_dir=(0, 1, 0))):
        with Locations((5.914097565, 5)):
            Rectangle(SKETCH_53_W, SKETCH_53_H)
        with Locations((12.133064736, 5)):
            Rectangle(SKETCH_53_W_2, SKETCH_53_H)
    extrude(amount=EXTRUDE_28_DEPTH)

    # 草图51 → 切除-拉伸22 (cut)
    with BuildSketch(Plane(origin=(13.565613054, 0, 0), x_dir=(0, 0, -1), z_dir=(1, 0, 0))):
        with Locations((16, 6.25)):
            Circle(SKETCH_51_R)
        with Locations((16, -6.25)):
            Circle(SKETCH_51_R)
    extrude(amount=-CUT_EXTRUDE_22_DEPTH, mode=Mode.SUBTRACT)

    # 草图52 → 切除-拉伸23 (cut)
    with BuildSketch(Plane(origin=(0, 11.25, 0), x_dir=(1, 0, 0), z_dir=(0, 1, 0))):
        with Locations((-26.5, 3.35)):
            Rectangle(SKETCH_52_W, SKETCH_52_H)
        with Locations((26.5, 3.35)):
            Rectangle(SKETCH_52_W, SKETCH_52_H)
    extrude(amount=-CUT_EXTRUDE_23_DEPTH, mode=Mode.SUBTRACT)

    # 草图54 → 切除-拉伸24 (cut)
    with BuildSketch(Plane(origin=(0, 0, -10), x_dir=(-1, 0, 0), z_dir=(0, 0, -1))):
        with BuildLine():
            ThreePointArc((-8.066400893, 12.099971928), (-6.289381928, 14.174985964), (-8.066400893, 16.25))
            Line((-8.066400893, 16.25), (-8.066400893, 12.099971928))
        make_face()
        with BuildLine():
            ThreePointArc((-8.066400893, 17.099971928), (-6.289381928, 19.174985964), (-8.066400893, 21.25))
            Line((-8.066400893, 21.25), (-8.066400893, 17.099971928))
        make_face()
    extrude(amount=-CUT_EXTRUDE_24_DEPTH, mode=Mode.SUBTRACT)

    # 草图55 → 凸台-拉伸29 (add)
    with BuildSketch(Plane.XY.offset(5)):
        Rectangle(SKETCH_55_W, SKETCH_55_H)
    extrude(amount=EXTRUDE_29_DEPTH)

    # 草图56 → 切除-拉伸25 (cut)
    with BuildSketch(Plane(origin=(0, 0, 0), x_dir=(-1, 0, 0), z_dir=(0, 0, -1))):
        with Locations((7.849440219, 0)):
            Rectangle(SKETCH_56_W, SKETCH_56_H)
    extrude(amount=-CUT_EXTRUDE_25_DEPTH, mode=Mode.SUBTRACT)

    # 草图57 → 凸台-拉伸30 (add)
    with BuildSketch(Plane(origin=(0, 11.25, 0), x_dir=(1, 0, 0), z_dir=(0, 1, 0))):
        with Locations((-18.465384327, -2.525)):
            Rectangle(SKETCH_57_W, SKETCH_57_H)
        with Locations((-34.665384327, -2.525)):
            Rectangle(SKETCH_57_W, SKETCH_57_H)
    extrude(amount=EXTRUDE_30_DEPTH)

    # 草图58 → 切除-拉伸26 (cut)
    with BuildSketch(Plane(origin=(0, 0, -10), x_dir=(-1, 0, 0), z_dir=(0, 0, -1))):
        with Locations((17.5, 0)):
            Rectangle(SKETCH_58_W, SKETCH_58_H)
        with Locations((-17.782806527, 0)):
            Rectangle(SKETCH_58_W_2, SKETCH_58_H)
    extrude(amount=-CUT_EXTRUDE_26_DEPTH, mode=Mode.SUBTRACT)

    # 草图59 → 切除-拉伸27 (cut)
    with BuildSketch(Plane(origin=(0, 14.9, 0), x_dir=(1, 0, 0), z_dir=(0, 1, 0))):
        Polygon((20.5, -86.2), (20.5, -81.2), (27.5, -81.2), (27.5, -70), (-27.5, -70), (-27.5, -81.2), (-20.5, -81.2), (-20.5, -86.2), (-27.5, -86.2), (-27.5, -95), (27.5, -95), (27.5, -86.2), align=None)
    extrude(amount=-CUT_EXTRUDE_27_DEPTH, mode=Mode.SUBTRACT)

    # 草图60 → 凸台-拉伸31 (add)
    with BuildSketch(Plane.XY.offset(5)):
        with Locations((-17.275, 0)):
            Rectangle(SKETCH_60_W, SKETCH_60_H)
        with Locations((17.275, 0)):
            Rectangle(SKETCH_60_W, SKETCH_60_H)
    extrude(amount=EXTRUDE_31_DEPTH)

    # 草图61 → 切除-拉伸28 (cut)
    with BuildSketch(Plane(origin=(0, 0, 0.05), x_dir=(-1, 0, 0), z_dir=(0, 0, -1))):
        with Locations((14.982692164, 0)):
            Rectangle(SKETCH_61_W, SKETCH_61_H)
    extrude(amount=-CUT_EXTRUDE_28_DEPTH, mode=Mode.SUBTRACT)

    # 草图62 → 凸台-拉伸32 (add)
    with BuildSketch(Plane.ZY.offset(27.5)):
        with Locations((83.7, 24.9)):
            Rectangle(SKETCH_62_W, SKETCH_62_H)
    extrude(amount=EXTRUDE_32_DEPTH)

    # 草图63 → 凸台-拉伸33 (add)
    with BuildSketch(Plane(origin=(27.5, 0, 0), x_dir=(0, 0, -1), z_dir=(1, 0, 0))):
        with Locations((-83.7, 24.9)):
            Rectangle(SKETCH_63_W, SKETCH_63_H)
    extrude(amount=EXTRUDE_33_DEPTH)

    # 草图64 → 凸台-拉伸34 (add)
    with BuildSketch(Plane(origin=(0, 0, -10), x_dir=(-1, 0, 0), z_dir=(0, 0, -1))):
        with Locations((-37.5, 0)):
            Rectangle(SKETCH_64_W, SKETCH_64_H)
    extrude(amount=EXTRUDE_34_DEPTH)

    # 草图65 → 切除-拉伸30 (cut)
    with BuildSketch(Plane(origin=(0, 0, -18), x_dir=(-1, 0, 0), z_dir=(0, 0, -1))):
        with Locations((-35.05, 0)):
            Rectangle(SKETCH_65_W, SKETCH_65_H)
    extrude(amount=-CUT_EXTRUDE_30_DEPTH, mode=Mode.SUBTRACT)

    # 草图66 → 凸台-拉伸35 (add)
    with BuildSketch(Plane(origin=(0, 0, -10), x_dir=(-1, 0, 0), z_dir=(0, 0, -1))):
        with Locations((37.5, 0)):
            Rectangle(SKETCH_66_W, SKETCH_66_H)
    extrude(amount=EXTRUDE_35_DEPTH)

    # 草图67 → 切除-拉伸31 (cut)
    with BuildSketch(Plane(origin=(40, 0, 0), x_dir=(0, 0, -1), z_dir=(1, 0, 0))):
        with Locations(Location((2.45, 4.25, 0), (0, 0, 90))):
            Circle(SKETCH_67_R)
        with Locations(Location((2.45, -3.75, 0), (0, 0, 90))):
            Circle(SKETCH_67_R)
        with Locations(Location((14.45, -3.75, 0), (0, 0, 90))):
            Circle(SKETCH_67_R)
        with Locations(Location((14.45, 4.25, 0), (0, 0, 90))):
            Circle(SKETCH_67_R)
    cut_extrude_31 = extrude(amount=-CUT_EXTRUDE_31_DEPTH, mode=Mode.SUBTRACT)

    # 镜向1: 切除-拉伸31 across plane
    add(cut_extrude_31.mirror(Plane(origin=(0, 0, 0), x_dir=(0, 0, 1), z_dir=(1, 0, 0))), mode=Mode.SUBTRACT)

    # 草图68 → 切除-拉伸32 (cut)
    with BuildSketch(Plane(origin=(0, 0, -18), x_dir=(-1, 0, 0), z_dir=(0, 0, -1))):
        with Locations((35.05, 0)):
            Rectangle(SKETCH_68_W, SKETCH_68_H)
    extrude(amount=-CUT_EXTRUDE_32_DEPTH, mode=Mode.SUBTRACT)

    # 草图69 → 凸台-拉伸36 (add)
    with BuildSketch(Plane.ZY.offset(18.55)):
        with Locations((11, 0)):
            Rectangle(SKETCH_69_W, SKETCH_69_H)
    extrude(amount=EXTRUDE_36_DEPTH)

    # 草图70 → 切除-拉伸33 (cut)
    with BuildSketch(Plane(origin=(0, 0, 70), x_dir=(-1, 0, 0), z_dir=(0, 0, -1))):
        Rectangle(SKETCH_70_W, SKETCH_70_H)
    extrude(amount=CUT_EXTRUDE_33_DEPTH, mode=Mode.SUBTRACT)

    # 草图73 → 切除-拉伸34 (cut)
    with BuildSketch(Plane(origin=(0, 0, 70), x_dir=(-1, 0, 0), z_dir=(0, 0, -1))):
        with Locations((0, -4.021373503)):
            Rectangle(SKETCH_73_W, SKETCH_73_H)
    extrude(amount=-CUT_EXTRUDE_34_DEPTH, mode=Mode.SUBTRACT)

    # 圆角5
    # the kernel refuses this fillet: 10 mm, written as the material it adds along each edge
    with BuildSketch(Plane(origin=(-27.5, 13.9, 86.2), x_dir=(0, -1, 0), z_dir=(0, 0, -1)), Plane(origin=(27.5, 13.9, 81.2), x_dir=(0, -1, 0), z_dir=(0, 0, 1))) as fillet_5_piece_1:
        with BuildLine():
            CenterArc((6, 10), FILLET_5_R, 233.130102354, 36.869897646)
            Line((0, 2), (0, 0))
            Line((0, 0), (6, 0))
        make_face()
    extrude(amount=5)

    # 草图75 → 凸台-拉伸38 (add)
    with BuildSketch(Plane(origin=(0, 0, 70), x_dir=(-1, 0, 0), z_dir=(0, 0, -1))):
        with Locations((0, -4.021373503)):
            Rectangle(SKETCH_75_W, SKETCH_75_H)
        with Locations((0, -4.021373503)):
            Rectangle(SKETCH_75_W_2, SKETCH_75_H_2, mode=Mode.SUBTRACT)
    extrude(amount=EXTRUDE_38_DEPTH)

    # 草图74 → 切除-拉伸35 (cut)
    with BuildSketch(Plane(origin=(10, 0, 0), x_dir=(0, 0, -1), z_dir=(1, 0, 0))):
        with BuildLine():
            Line((-82.596309624, -2.421373503), (-58.15800679, -2.421373503))
            ThreePointArc((-58.15800679, -2.421373503), (-56.55800679, -4.021373503), (-58.15800679, -5.621373503))
            Line((-58.15800679, -5.621373503), (-82.596309624, -5.621373503))
            ThreePointArc((-82.596309624, -5.621373503), (-84.196309624, -4.021373503), (-82.596309624, -2.421373503))
        make_face()
    extrude(amount=-CUT_EXTRUDE_35_DEPTH, mode=Mode.SUBTRACT)

    # 草图76 → 切除-拉伸36 (cut)
    with BuildSketch(Plane(origin=(0, 0, 55), x_dir=(-1, 0, 0), z_dir=(0, 0, -1))):
        with Locations((-8.175, -4.021373503)):
            Rectangle(SKETCH_76_W, SKETCH_76_H)
        with Locations((8.175, -4.021373503)):
            Rectangle(SKETCH_76_W, SKETCH_76_H)
    extrude(amount=-CUT_EXTRUDE_36_DEPTH, mode=Mode.SUBTRACT)

    # 圆角6
    # the kernel refuses this fillet: 10 mm, written as the material it adds along each edge
    with BuildSketch(Plane(origin=(-6.35, 0.478626497, 80), x_dir=(-1, 0, 0), z_dir=(0, -1, 0))) as fillet_6_piece_1:
        with BuildLine():
            CenterArc((10, 7.725121358), FILLET_6_R, 180, 50.580015533)
            Line((0, 7.725121358), (0, 0))
            Line((0, 0), (3.65, 0))
        make_face()
    extrude(amount=2.9)
    with BuildSketch(Plane(origin=(6.35, 0.478626497, 80), x_dir=(1, 0, 0), z_dir=(0, -1, 0))) as fillet_6_piece_2:
        with BuildLine():
            CenterArc((10, -7.725121358), FILLET_6_R, 129.419984467, 50.580015533)
            Line((0, -7.725121358), (0, 0))
            Line((0, 0), (3.65, 0))
        make_face()
    extrude(amount=2.9)

    # 倒角6
    chamfer_6_edges = [part.edges().sort_by_distance(p)[0] for p in [
        (0, 1.957252994, 70),
    ]]
    chamfer(chamfer_6_edges, length=CHAMFER_6_SIZE)


solid = part.part
